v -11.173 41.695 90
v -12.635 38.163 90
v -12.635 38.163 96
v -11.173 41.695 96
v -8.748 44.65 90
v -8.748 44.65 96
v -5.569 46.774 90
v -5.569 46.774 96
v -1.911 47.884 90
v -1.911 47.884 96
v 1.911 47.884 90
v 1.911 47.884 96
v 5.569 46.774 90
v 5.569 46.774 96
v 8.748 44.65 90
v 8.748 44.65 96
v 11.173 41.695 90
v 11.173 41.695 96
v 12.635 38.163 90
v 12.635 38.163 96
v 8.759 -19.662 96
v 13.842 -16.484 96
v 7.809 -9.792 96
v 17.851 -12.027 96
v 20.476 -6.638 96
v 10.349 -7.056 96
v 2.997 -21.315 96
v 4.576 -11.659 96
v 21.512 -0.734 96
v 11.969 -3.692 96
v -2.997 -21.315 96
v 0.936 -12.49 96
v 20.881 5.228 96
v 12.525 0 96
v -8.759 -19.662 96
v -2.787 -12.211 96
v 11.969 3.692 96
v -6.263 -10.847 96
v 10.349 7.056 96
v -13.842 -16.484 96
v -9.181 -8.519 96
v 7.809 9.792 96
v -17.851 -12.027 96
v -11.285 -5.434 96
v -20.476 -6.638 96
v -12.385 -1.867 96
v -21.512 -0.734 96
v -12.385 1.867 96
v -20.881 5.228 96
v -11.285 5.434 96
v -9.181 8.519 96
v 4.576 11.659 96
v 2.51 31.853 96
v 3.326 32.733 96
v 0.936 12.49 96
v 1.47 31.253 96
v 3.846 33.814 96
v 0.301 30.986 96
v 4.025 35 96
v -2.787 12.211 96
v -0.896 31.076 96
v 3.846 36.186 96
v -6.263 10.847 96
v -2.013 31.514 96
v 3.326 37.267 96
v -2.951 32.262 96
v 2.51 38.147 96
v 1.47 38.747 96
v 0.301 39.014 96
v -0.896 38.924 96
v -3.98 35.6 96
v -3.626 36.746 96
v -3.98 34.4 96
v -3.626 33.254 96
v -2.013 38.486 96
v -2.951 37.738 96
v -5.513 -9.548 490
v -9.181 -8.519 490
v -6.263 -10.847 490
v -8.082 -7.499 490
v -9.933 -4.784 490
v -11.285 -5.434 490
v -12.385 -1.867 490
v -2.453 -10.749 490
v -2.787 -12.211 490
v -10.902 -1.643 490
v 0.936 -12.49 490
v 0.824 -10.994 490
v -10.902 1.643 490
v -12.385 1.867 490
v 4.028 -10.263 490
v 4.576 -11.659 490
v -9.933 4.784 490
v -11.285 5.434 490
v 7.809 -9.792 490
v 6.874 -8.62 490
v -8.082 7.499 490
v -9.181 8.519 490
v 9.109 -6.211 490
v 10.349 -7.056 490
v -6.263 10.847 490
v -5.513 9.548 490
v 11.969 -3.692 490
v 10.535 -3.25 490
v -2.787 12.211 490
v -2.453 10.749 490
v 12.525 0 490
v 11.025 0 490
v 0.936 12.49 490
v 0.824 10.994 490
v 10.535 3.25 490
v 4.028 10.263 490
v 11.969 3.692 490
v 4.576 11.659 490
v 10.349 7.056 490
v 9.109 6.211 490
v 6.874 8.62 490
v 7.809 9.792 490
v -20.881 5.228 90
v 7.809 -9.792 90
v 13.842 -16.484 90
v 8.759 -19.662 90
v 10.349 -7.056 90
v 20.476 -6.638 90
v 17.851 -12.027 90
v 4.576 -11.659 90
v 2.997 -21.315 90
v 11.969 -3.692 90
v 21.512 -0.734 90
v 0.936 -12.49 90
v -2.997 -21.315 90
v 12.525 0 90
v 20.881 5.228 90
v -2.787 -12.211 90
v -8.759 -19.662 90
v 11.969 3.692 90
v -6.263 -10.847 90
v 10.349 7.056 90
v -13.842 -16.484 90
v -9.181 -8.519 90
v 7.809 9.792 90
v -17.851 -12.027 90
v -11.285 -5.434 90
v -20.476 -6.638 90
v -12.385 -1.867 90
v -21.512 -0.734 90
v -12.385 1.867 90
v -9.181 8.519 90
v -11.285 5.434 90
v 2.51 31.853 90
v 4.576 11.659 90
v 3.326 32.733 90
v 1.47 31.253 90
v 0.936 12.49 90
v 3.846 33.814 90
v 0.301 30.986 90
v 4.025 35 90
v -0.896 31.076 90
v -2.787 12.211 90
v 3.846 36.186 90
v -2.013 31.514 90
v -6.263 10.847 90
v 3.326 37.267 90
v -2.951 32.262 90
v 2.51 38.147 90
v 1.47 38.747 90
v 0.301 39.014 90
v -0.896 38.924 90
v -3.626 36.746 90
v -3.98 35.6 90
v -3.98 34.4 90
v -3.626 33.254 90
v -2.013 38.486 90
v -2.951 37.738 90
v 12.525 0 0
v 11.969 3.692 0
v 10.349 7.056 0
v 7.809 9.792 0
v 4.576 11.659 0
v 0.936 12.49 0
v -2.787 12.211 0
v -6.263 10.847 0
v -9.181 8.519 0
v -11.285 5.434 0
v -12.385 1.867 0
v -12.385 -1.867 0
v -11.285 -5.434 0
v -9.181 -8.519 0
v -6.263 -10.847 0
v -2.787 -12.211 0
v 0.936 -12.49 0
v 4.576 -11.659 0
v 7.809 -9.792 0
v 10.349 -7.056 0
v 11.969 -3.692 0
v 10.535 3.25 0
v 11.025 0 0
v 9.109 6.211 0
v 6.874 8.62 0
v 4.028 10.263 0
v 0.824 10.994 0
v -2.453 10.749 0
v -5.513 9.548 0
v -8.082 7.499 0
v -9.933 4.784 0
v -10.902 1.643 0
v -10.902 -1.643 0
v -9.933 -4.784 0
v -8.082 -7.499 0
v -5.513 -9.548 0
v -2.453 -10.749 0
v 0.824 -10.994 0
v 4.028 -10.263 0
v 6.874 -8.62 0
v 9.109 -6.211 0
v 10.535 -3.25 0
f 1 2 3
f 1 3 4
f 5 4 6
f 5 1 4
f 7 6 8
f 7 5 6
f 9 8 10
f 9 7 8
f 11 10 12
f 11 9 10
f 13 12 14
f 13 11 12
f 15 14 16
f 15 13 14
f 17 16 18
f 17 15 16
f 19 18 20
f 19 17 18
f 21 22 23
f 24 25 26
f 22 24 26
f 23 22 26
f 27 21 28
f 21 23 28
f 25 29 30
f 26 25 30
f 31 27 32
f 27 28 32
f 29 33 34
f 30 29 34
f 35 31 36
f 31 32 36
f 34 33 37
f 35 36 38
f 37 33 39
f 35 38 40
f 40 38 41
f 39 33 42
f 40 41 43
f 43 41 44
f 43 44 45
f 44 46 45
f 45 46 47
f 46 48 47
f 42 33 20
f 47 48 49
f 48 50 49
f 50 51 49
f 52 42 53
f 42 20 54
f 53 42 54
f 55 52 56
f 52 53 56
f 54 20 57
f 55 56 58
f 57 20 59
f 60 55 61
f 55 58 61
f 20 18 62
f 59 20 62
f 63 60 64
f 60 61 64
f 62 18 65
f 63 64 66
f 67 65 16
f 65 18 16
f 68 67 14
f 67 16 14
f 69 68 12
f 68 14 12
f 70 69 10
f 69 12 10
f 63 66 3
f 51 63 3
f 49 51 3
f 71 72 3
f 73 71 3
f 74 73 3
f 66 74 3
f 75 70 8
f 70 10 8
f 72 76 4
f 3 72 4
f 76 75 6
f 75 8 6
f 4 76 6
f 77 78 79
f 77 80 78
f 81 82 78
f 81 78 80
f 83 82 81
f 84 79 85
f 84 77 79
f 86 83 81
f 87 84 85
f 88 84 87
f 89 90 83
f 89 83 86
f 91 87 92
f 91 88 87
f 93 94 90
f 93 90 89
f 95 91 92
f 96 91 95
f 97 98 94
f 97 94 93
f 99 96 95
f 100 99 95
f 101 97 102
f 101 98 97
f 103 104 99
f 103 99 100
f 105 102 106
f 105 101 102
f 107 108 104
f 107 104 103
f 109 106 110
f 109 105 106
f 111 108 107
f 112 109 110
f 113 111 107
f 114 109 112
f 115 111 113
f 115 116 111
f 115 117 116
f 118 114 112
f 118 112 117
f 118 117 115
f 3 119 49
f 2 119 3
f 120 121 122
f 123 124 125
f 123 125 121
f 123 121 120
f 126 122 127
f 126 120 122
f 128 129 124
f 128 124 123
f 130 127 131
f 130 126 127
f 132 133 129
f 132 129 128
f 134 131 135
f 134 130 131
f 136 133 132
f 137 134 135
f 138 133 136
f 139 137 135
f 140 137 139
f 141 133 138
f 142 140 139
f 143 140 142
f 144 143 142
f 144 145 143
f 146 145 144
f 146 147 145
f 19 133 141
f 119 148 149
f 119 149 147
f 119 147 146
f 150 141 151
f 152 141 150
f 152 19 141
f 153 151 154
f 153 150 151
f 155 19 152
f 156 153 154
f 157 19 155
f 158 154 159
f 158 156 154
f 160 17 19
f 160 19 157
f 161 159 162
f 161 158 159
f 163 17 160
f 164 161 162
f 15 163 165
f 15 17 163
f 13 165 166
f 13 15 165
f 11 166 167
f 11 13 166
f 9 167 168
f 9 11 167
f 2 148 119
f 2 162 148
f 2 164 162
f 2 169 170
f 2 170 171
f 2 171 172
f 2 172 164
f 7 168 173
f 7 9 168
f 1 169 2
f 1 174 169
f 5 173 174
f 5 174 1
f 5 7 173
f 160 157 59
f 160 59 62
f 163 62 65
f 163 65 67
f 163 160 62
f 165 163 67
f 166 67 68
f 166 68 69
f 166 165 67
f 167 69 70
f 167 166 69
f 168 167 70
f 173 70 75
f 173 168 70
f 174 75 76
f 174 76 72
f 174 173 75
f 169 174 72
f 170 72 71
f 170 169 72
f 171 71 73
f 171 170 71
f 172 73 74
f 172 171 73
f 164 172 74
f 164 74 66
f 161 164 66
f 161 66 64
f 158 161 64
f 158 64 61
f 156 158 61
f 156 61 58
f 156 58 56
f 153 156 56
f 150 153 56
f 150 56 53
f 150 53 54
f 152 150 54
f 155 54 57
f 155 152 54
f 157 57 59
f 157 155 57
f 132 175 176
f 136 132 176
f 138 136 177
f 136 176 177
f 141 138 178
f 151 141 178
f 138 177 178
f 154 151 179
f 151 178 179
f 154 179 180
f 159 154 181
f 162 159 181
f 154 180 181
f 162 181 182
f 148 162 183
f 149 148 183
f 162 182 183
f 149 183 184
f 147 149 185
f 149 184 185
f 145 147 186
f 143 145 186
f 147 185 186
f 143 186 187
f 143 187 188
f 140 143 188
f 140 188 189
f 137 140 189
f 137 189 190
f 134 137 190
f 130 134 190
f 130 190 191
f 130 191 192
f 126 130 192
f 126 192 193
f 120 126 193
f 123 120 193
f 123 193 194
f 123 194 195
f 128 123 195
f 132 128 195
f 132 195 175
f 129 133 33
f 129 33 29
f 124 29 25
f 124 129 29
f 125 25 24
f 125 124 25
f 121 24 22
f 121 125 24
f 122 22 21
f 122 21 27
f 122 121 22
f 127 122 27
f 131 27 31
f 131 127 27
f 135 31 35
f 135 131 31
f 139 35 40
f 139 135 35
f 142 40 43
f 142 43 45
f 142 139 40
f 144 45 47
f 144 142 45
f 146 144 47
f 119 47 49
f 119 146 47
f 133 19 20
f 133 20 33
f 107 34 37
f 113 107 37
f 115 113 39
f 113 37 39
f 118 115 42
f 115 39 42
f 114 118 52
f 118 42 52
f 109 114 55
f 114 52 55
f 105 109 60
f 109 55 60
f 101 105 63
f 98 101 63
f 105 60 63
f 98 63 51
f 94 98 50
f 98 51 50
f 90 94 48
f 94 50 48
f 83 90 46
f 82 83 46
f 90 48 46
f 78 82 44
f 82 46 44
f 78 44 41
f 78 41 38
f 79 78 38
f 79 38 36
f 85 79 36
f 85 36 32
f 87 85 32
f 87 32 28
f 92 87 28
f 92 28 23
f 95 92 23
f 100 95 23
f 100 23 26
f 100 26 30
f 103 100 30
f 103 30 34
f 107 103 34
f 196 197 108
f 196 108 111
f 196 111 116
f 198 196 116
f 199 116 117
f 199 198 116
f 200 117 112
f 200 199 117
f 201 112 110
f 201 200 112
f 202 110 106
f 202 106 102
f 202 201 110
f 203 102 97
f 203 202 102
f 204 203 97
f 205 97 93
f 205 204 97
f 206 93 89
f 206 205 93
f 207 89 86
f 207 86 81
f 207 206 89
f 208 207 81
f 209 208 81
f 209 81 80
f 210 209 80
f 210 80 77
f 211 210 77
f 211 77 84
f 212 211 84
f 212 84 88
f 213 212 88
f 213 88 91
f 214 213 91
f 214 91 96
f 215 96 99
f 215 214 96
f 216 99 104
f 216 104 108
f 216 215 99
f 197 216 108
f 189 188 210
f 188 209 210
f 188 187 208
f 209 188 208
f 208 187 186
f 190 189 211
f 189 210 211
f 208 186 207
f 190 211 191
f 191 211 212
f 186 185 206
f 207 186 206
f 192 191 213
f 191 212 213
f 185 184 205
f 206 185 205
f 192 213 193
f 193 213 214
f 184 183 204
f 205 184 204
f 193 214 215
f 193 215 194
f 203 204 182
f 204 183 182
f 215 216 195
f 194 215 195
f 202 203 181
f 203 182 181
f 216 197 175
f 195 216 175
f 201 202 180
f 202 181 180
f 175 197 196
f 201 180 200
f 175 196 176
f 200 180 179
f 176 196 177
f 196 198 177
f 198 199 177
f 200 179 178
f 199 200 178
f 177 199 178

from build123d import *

# Parameters (mm, degrees)
SKETCH1_R           = 12.525
SKETCH1_R_2         = 11.025
EXTRUDE_THIN1_DEPTH = 490
BOSS_EXTRUDE2_START = 90
SKETCH1_4_R         = 12.525
SKETCH1_4_R_2       = 4.025
BOSS_EXTRUDE2_DEPTH = 6


with BuildPart() as part:
    # Sketch1 → Extrude-Thin1 (new body)
    with BuildSketch(Plane.XY):
        Circle(SKETCH1_R)
        Circle(SKETCH1_R_2, mode=Mode.SUBTRACT)
    extrude(amount=EXTRUDE_THIN1_DEPTH)

    # Sketch1<4> → Boss-Extrude2 (add)
    with BuildSketch(Plane.XY.offset(BOSS_EXTRUDE2_START)):
        with BuildLine():
            Line((-20.880585929, 5.2275), (-12.635058385, 38.163214286))
            ThreePointArc((-12.635058385, 38.163214286), (0, 48.025), (12.635058385, 38.163214286))
            Line((12.635058385, 38.163214286), (20.880585929, 5.2275))
            ThreePointArc((20.880585929, 5.2275), (0, -21.525), (-20.880585929, 5.2275))
        make_face()
        Circle(SKETCH1_4_R, mode=Mode.SUBTRACT)
        with Locations((0, 35)):
            Circle(SKETCH1_4_R_2, mode=Mode.SUBTRACT)
    extrude(amount=BOSS_EXTRUDE2_DEPTH)


solid = part.part
